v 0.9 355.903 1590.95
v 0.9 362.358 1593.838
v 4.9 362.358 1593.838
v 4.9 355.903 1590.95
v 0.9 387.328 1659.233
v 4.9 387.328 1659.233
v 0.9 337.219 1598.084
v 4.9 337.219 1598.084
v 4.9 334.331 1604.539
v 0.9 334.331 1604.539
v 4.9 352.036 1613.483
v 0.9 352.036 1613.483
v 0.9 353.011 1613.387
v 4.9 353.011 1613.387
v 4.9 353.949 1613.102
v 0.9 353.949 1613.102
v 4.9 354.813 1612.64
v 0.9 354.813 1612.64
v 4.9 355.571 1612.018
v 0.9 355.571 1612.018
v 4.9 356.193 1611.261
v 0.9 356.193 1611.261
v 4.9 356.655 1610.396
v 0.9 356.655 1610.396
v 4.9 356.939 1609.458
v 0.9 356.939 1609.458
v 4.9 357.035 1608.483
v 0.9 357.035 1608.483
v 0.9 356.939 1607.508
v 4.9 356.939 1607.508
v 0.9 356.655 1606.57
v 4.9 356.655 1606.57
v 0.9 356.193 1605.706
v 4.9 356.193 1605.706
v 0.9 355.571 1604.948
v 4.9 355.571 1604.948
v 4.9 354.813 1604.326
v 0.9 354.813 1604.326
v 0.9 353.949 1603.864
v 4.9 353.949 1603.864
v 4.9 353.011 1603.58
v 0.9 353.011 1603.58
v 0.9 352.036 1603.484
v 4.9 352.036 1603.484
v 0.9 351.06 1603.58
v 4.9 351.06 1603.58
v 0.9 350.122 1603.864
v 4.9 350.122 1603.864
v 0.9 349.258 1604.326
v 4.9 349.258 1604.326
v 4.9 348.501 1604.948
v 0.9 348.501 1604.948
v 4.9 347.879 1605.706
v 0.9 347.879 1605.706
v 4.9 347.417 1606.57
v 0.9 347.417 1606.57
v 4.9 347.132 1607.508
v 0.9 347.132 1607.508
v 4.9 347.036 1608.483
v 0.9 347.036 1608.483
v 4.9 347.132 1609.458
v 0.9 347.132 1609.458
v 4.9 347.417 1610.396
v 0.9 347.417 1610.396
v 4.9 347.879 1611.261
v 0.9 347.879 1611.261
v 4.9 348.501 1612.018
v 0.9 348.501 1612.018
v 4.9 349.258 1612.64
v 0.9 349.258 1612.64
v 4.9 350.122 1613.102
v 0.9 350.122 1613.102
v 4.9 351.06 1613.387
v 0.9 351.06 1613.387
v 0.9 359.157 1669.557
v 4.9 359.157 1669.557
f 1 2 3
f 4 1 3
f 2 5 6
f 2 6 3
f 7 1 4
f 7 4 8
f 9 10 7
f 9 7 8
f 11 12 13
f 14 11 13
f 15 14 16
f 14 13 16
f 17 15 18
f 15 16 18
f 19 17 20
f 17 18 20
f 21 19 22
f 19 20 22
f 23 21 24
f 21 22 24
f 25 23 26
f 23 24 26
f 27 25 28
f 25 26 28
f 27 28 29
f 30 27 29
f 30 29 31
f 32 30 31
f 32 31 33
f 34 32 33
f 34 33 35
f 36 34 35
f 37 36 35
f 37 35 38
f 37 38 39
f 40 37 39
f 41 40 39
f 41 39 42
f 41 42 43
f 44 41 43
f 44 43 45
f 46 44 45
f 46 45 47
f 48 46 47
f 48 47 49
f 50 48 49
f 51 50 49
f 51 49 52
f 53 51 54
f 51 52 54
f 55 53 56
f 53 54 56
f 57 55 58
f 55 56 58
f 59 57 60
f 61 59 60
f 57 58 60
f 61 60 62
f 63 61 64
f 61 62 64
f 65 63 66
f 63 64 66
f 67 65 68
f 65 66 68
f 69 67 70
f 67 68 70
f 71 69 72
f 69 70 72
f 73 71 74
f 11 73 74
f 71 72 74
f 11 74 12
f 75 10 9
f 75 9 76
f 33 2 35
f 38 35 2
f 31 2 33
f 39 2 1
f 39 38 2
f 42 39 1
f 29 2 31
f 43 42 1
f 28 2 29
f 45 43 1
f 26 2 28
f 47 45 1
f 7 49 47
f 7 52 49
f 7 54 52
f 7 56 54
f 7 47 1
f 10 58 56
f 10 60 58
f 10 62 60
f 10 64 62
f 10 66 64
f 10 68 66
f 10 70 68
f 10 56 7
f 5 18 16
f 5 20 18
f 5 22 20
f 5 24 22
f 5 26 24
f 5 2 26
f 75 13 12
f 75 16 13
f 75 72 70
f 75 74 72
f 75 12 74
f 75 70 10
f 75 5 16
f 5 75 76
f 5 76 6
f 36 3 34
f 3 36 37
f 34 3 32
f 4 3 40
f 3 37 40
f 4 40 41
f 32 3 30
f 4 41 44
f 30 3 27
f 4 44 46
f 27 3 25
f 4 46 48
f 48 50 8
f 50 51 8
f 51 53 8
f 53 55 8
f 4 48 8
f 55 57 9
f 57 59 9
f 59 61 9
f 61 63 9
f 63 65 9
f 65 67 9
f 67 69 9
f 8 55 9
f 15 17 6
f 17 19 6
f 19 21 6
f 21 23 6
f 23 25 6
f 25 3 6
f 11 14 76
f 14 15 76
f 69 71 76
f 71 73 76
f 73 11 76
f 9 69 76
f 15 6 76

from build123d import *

# Parameters (mm, degrees)
BOSS_EXTRUDE1_DEPTH  = 4
M8_CLEARANCE_HOLE1_D = 9.999053744
CHAMFER1_SIZE        = 5


with BuildPart() as part:
    # Sketch1 → Boss-Extrude1 (new body)
    with BuildSketch(Plane(origin=(0.900000083, 0, 0), x_dir=(0, -1, 0), z_dir=(-1, 0, 0))):
        Polygon((-360.573996926, 1589.166586834), (-332.547614774, 1599.868077547), (-359.157201755, 1669.556541862), (-387.327723707, 1659.232542214), align=None)
    extrude(amount=-BOSS_EXTRUDE1_DEPTH)

    # M8 Clearance Hole1 (through all)
    with Locations(Plane(origin=(4.900000083, 0, 0), x_dir=(0, 0, -1), z_dir=(1, 0, 0))):
        with Locations((-1608.483107892, 352.03572843)):
            Hole(M8_CLEARANCE_HOLE1_D / 2)

    # Chamfer1
    chamfer1_edges = [part.edges().sort_by_distance(p)[0] for p in [
        (2.900000083, 332.547614774, 1599.868077547),
        (2.900000083, 360.573996926, 1589.166586834),
    ]]
    chamfer(chamfer1_edges, length=CHAMFER1_SIZE)


solid = part.part
